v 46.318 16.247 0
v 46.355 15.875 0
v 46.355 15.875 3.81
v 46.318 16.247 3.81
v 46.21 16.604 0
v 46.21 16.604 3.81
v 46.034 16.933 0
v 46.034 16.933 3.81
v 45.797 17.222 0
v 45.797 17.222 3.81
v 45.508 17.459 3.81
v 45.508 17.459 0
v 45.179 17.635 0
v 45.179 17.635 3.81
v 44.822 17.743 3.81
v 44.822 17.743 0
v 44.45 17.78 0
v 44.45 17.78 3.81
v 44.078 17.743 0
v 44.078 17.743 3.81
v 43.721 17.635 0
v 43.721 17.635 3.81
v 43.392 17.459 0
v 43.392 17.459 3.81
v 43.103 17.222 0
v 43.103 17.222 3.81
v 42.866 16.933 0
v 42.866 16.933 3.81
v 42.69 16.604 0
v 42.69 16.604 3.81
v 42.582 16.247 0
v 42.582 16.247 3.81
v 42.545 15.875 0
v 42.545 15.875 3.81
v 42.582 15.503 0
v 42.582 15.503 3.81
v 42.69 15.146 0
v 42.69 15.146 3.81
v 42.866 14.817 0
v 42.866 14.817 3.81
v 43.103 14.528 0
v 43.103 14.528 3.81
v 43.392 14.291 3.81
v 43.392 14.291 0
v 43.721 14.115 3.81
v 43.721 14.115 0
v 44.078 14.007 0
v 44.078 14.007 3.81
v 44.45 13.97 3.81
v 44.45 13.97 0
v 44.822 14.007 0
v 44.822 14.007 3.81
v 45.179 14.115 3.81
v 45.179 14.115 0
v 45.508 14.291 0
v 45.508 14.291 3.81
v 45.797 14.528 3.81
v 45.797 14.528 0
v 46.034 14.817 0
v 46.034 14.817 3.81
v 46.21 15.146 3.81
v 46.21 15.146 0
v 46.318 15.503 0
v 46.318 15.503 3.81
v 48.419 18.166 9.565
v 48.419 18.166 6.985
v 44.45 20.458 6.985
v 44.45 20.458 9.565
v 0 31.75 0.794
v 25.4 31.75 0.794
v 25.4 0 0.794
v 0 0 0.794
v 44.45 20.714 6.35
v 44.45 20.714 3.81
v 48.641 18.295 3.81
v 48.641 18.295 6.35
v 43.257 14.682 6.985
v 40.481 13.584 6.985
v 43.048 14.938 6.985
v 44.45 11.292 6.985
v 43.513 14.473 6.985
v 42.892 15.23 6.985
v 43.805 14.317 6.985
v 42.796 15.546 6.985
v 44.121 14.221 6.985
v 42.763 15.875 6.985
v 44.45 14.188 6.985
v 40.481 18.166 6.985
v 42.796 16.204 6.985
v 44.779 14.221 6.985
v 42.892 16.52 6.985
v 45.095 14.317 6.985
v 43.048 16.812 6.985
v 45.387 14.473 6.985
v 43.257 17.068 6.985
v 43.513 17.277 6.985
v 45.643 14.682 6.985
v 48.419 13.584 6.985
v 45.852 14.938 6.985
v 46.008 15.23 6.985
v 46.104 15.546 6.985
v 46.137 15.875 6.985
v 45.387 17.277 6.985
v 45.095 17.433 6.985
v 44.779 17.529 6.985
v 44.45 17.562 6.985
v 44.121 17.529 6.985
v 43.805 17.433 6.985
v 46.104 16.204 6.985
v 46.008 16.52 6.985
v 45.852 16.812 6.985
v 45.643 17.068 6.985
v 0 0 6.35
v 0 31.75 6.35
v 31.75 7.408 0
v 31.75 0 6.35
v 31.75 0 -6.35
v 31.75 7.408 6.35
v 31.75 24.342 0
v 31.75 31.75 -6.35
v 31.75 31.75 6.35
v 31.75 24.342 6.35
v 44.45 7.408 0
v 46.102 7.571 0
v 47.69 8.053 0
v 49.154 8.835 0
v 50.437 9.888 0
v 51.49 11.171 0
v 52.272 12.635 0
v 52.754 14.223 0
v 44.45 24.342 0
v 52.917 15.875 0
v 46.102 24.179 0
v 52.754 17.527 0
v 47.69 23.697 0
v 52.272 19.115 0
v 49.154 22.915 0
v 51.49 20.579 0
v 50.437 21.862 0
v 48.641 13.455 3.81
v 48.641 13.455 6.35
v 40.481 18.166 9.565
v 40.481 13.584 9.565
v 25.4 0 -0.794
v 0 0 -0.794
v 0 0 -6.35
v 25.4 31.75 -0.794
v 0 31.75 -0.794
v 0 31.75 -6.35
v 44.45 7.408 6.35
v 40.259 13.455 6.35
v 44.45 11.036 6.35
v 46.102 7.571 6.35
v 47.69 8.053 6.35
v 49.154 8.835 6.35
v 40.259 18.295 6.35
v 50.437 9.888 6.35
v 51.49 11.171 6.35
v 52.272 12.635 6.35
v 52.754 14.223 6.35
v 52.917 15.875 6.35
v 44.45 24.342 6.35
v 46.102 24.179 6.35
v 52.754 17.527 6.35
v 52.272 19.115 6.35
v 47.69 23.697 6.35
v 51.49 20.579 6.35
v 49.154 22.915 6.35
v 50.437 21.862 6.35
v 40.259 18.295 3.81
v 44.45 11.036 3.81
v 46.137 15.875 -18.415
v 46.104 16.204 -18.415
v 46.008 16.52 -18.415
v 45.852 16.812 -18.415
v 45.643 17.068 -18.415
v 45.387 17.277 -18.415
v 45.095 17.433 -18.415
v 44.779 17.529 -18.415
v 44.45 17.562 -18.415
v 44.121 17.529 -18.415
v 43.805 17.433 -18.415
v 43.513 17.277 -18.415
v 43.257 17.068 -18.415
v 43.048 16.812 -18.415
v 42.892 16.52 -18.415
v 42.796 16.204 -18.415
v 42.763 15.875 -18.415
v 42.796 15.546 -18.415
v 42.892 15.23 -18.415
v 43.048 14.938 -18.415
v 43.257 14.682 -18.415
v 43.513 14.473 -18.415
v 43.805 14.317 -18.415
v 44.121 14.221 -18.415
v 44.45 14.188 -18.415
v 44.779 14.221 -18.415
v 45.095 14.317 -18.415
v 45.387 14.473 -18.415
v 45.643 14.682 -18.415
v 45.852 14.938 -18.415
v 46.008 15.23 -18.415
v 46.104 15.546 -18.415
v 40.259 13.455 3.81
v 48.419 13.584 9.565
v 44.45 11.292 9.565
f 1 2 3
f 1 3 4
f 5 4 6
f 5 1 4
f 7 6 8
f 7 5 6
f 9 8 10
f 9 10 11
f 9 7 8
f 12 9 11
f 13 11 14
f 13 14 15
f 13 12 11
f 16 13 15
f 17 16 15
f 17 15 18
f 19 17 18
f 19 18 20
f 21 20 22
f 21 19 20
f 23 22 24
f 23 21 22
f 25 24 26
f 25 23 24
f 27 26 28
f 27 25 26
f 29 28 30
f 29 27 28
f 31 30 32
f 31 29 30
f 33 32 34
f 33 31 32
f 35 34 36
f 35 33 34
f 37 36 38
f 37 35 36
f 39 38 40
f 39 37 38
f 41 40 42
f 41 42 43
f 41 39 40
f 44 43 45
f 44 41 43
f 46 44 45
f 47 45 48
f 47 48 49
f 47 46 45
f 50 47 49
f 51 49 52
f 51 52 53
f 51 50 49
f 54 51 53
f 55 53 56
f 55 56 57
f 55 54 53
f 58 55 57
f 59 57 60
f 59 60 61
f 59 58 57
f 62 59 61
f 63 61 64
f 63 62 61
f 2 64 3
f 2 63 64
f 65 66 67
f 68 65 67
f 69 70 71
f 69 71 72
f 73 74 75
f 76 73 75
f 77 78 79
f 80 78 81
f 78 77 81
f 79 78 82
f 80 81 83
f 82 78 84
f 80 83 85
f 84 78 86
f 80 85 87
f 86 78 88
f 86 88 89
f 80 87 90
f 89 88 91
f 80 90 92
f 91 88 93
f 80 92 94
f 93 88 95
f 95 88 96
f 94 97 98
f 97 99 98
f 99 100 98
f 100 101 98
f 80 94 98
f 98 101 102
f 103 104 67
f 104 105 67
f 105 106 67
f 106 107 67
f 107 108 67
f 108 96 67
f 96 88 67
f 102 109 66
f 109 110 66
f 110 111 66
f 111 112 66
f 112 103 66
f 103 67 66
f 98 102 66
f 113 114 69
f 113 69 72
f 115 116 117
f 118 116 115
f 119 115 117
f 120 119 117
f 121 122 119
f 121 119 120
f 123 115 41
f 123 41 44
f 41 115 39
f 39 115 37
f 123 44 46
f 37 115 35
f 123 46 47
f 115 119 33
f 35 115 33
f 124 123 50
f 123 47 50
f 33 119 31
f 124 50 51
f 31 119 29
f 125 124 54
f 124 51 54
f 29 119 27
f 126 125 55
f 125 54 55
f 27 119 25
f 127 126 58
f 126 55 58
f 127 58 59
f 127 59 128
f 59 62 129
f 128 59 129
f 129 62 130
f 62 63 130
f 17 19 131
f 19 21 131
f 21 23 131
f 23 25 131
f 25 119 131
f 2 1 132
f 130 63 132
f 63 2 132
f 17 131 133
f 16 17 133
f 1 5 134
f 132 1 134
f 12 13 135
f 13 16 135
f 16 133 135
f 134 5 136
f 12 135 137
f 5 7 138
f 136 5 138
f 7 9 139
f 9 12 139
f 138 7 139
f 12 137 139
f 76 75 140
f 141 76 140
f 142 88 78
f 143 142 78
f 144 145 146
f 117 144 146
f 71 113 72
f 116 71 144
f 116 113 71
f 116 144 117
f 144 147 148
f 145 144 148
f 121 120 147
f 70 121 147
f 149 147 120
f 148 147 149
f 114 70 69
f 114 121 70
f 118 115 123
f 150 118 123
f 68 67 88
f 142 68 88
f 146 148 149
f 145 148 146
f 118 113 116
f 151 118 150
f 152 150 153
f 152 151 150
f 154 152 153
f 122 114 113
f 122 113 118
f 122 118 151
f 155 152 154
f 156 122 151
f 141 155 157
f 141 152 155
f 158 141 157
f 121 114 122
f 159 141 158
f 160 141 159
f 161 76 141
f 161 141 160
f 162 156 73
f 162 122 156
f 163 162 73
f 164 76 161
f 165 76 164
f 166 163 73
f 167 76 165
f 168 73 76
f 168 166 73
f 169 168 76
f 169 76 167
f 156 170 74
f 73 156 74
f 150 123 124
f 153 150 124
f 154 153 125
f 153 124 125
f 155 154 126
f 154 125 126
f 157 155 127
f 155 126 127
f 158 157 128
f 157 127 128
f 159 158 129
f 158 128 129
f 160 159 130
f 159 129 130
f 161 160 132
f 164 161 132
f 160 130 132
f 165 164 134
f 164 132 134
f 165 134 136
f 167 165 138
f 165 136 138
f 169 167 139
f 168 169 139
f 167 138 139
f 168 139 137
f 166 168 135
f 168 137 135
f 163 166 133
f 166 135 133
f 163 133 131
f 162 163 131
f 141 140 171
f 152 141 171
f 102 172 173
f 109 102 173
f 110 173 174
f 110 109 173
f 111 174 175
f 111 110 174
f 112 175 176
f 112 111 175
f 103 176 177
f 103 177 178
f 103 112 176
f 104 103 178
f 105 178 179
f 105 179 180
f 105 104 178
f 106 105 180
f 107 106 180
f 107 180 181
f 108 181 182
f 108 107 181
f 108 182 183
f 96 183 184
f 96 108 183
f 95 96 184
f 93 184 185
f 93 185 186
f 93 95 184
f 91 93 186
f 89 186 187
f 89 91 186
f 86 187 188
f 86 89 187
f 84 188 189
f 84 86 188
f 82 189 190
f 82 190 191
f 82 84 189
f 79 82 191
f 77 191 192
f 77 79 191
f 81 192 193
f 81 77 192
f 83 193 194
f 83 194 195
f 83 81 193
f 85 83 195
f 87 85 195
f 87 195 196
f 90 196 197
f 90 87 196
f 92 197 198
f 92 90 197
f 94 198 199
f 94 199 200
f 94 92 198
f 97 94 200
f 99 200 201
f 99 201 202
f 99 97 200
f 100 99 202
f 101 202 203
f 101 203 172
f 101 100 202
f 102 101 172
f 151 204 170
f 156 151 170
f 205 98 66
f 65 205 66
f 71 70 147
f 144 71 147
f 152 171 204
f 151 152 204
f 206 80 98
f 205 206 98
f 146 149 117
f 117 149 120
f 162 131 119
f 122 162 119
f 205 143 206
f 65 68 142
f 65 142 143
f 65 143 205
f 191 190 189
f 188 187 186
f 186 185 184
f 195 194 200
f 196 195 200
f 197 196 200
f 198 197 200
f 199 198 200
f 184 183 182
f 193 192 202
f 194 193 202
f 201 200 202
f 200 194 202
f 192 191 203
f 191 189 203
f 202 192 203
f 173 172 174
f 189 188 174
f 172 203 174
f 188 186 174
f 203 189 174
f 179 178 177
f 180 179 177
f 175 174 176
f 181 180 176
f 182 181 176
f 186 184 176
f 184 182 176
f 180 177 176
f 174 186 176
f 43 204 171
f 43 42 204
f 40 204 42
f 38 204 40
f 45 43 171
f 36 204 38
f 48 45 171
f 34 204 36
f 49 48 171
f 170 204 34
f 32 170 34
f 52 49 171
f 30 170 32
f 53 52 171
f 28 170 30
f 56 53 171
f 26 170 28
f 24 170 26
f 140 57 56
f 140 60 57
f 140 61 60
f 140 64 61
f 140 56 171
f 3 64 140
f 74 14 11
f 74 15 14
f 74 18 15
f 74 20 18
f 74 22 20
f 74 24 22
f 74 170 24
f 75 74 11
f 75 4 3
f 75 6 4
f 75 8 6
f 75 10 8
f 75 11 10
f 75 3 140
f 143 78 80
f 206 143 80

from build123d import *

# Parameters (mm, degrees)
F1_DEPTH = 6.35
F2_DEPTH = 6.35
F0_R     = 1.905
F3_DEPTH = 3.81
F4_W     = 25.4
F4_H     = 0.79375
F5_DEPTH = 31.751
F7_R     = 1.68671875
F8_DEPTH = 25.4
F9_DEPTH = 2.5796875


with BuildPart() as f1:
    # F0 (on Top) → F1 (new body, symmetric)
    with BuildSketch(Plane.XY):
        Polygon((31.75, 31.75), (0, 31.75), (0, 0), (31.75, 0), (31.75, 7.4083333333), (31.75, 24.3416666667), align=None)
    extrude(amount=F1_DEPTH, both=True)

    # F0 (on Top) → F2 (join)
    with BuildSketch(Plane.XY):
        with BuildLine():
            Line((44.45, 24.3416666667), (31.75, 24.3416666667))
            Line((31.75, 24.3416666667), (31.75, 7.4083333333))
            Line((31.75, 7.4083333333), (44.45, 7.4083333333))
            ThreePointArc((44.45, 7.4083333333), (52.9166666667, 15.875), (44.45, 24.3416666667))
        make_face()
        Polygon((44.45, 20.7143499563), (48.641, 18.2946749782), (48.641, 13.4553250218), (44.45, 11.0356500437), (40.259, 13.4553250218), (40.259, 18.2946749782), align=None, mode=Mode.SUBTRACT)
    extrude(amount=F2_DEPTH)

    # F0 (on Top) → F3 (join)
    with BuildSketch(Plane.XY):
        Polygon((48.641, 13.4553250218), (48.641, 18.2946749782), (44.45, 20.7143499563), (40.259, 18.2946749782), (40.259, 13.4553250218), (44.45, 11.0356500437), align=None)
        with Locations((44.45, 15.875)):
            Circle(F0_R, mode=Mode.SUBTRACT)
    extrude(amount=F3_DEPTH)

    # F4 (on face) → F5 (cut, through all)
    with BuildSketch(Plane(origin=(0, 31.75, 0), x_dir=(-1, 0, 0), z_dir=(0, 1, 0))):
        with Locations((-12.7, 0.396875)):
            Rectangle(F4_W, F4_H)
        with Locations((-12.7, -0.396875)):
            Rectangle(F4_W, F4_H)
    extrude(amount=-F5_DEPTH, mode=Mode.SUBTRACT)


with BuildPart() as f8:
    # F7 (on offset) → F8 (new body)
    with BuildSketch(Plane.XY.offset(6.985)):
        with Locations((44.45, 15.875)):
            Circle(F7_R)
    extrude(amount=-F8_DEPTH)

    # F7 (on offset) → F9 (join)
    with BuildSketch(Plane.XY.offset(6.985)):
        Polygon((48.41875, 13.5836411192), (48.41875, 18.1663588808), (44.45, 20.4577177617), (40.48125, 18.1663588808), (40.48125, 13.5836411192), (44.45, 11.2922822383), align=None)
        with Locations((44.45, 15.875)):
            Circle(F7_R, mode=Mode.SUBTRACT)
        with Locations((44.45, 15.875)):
            Circle(F7_R)
    extrude(amount=F9_DEPTH)


solid = Compound([f1.part, f8.part])
